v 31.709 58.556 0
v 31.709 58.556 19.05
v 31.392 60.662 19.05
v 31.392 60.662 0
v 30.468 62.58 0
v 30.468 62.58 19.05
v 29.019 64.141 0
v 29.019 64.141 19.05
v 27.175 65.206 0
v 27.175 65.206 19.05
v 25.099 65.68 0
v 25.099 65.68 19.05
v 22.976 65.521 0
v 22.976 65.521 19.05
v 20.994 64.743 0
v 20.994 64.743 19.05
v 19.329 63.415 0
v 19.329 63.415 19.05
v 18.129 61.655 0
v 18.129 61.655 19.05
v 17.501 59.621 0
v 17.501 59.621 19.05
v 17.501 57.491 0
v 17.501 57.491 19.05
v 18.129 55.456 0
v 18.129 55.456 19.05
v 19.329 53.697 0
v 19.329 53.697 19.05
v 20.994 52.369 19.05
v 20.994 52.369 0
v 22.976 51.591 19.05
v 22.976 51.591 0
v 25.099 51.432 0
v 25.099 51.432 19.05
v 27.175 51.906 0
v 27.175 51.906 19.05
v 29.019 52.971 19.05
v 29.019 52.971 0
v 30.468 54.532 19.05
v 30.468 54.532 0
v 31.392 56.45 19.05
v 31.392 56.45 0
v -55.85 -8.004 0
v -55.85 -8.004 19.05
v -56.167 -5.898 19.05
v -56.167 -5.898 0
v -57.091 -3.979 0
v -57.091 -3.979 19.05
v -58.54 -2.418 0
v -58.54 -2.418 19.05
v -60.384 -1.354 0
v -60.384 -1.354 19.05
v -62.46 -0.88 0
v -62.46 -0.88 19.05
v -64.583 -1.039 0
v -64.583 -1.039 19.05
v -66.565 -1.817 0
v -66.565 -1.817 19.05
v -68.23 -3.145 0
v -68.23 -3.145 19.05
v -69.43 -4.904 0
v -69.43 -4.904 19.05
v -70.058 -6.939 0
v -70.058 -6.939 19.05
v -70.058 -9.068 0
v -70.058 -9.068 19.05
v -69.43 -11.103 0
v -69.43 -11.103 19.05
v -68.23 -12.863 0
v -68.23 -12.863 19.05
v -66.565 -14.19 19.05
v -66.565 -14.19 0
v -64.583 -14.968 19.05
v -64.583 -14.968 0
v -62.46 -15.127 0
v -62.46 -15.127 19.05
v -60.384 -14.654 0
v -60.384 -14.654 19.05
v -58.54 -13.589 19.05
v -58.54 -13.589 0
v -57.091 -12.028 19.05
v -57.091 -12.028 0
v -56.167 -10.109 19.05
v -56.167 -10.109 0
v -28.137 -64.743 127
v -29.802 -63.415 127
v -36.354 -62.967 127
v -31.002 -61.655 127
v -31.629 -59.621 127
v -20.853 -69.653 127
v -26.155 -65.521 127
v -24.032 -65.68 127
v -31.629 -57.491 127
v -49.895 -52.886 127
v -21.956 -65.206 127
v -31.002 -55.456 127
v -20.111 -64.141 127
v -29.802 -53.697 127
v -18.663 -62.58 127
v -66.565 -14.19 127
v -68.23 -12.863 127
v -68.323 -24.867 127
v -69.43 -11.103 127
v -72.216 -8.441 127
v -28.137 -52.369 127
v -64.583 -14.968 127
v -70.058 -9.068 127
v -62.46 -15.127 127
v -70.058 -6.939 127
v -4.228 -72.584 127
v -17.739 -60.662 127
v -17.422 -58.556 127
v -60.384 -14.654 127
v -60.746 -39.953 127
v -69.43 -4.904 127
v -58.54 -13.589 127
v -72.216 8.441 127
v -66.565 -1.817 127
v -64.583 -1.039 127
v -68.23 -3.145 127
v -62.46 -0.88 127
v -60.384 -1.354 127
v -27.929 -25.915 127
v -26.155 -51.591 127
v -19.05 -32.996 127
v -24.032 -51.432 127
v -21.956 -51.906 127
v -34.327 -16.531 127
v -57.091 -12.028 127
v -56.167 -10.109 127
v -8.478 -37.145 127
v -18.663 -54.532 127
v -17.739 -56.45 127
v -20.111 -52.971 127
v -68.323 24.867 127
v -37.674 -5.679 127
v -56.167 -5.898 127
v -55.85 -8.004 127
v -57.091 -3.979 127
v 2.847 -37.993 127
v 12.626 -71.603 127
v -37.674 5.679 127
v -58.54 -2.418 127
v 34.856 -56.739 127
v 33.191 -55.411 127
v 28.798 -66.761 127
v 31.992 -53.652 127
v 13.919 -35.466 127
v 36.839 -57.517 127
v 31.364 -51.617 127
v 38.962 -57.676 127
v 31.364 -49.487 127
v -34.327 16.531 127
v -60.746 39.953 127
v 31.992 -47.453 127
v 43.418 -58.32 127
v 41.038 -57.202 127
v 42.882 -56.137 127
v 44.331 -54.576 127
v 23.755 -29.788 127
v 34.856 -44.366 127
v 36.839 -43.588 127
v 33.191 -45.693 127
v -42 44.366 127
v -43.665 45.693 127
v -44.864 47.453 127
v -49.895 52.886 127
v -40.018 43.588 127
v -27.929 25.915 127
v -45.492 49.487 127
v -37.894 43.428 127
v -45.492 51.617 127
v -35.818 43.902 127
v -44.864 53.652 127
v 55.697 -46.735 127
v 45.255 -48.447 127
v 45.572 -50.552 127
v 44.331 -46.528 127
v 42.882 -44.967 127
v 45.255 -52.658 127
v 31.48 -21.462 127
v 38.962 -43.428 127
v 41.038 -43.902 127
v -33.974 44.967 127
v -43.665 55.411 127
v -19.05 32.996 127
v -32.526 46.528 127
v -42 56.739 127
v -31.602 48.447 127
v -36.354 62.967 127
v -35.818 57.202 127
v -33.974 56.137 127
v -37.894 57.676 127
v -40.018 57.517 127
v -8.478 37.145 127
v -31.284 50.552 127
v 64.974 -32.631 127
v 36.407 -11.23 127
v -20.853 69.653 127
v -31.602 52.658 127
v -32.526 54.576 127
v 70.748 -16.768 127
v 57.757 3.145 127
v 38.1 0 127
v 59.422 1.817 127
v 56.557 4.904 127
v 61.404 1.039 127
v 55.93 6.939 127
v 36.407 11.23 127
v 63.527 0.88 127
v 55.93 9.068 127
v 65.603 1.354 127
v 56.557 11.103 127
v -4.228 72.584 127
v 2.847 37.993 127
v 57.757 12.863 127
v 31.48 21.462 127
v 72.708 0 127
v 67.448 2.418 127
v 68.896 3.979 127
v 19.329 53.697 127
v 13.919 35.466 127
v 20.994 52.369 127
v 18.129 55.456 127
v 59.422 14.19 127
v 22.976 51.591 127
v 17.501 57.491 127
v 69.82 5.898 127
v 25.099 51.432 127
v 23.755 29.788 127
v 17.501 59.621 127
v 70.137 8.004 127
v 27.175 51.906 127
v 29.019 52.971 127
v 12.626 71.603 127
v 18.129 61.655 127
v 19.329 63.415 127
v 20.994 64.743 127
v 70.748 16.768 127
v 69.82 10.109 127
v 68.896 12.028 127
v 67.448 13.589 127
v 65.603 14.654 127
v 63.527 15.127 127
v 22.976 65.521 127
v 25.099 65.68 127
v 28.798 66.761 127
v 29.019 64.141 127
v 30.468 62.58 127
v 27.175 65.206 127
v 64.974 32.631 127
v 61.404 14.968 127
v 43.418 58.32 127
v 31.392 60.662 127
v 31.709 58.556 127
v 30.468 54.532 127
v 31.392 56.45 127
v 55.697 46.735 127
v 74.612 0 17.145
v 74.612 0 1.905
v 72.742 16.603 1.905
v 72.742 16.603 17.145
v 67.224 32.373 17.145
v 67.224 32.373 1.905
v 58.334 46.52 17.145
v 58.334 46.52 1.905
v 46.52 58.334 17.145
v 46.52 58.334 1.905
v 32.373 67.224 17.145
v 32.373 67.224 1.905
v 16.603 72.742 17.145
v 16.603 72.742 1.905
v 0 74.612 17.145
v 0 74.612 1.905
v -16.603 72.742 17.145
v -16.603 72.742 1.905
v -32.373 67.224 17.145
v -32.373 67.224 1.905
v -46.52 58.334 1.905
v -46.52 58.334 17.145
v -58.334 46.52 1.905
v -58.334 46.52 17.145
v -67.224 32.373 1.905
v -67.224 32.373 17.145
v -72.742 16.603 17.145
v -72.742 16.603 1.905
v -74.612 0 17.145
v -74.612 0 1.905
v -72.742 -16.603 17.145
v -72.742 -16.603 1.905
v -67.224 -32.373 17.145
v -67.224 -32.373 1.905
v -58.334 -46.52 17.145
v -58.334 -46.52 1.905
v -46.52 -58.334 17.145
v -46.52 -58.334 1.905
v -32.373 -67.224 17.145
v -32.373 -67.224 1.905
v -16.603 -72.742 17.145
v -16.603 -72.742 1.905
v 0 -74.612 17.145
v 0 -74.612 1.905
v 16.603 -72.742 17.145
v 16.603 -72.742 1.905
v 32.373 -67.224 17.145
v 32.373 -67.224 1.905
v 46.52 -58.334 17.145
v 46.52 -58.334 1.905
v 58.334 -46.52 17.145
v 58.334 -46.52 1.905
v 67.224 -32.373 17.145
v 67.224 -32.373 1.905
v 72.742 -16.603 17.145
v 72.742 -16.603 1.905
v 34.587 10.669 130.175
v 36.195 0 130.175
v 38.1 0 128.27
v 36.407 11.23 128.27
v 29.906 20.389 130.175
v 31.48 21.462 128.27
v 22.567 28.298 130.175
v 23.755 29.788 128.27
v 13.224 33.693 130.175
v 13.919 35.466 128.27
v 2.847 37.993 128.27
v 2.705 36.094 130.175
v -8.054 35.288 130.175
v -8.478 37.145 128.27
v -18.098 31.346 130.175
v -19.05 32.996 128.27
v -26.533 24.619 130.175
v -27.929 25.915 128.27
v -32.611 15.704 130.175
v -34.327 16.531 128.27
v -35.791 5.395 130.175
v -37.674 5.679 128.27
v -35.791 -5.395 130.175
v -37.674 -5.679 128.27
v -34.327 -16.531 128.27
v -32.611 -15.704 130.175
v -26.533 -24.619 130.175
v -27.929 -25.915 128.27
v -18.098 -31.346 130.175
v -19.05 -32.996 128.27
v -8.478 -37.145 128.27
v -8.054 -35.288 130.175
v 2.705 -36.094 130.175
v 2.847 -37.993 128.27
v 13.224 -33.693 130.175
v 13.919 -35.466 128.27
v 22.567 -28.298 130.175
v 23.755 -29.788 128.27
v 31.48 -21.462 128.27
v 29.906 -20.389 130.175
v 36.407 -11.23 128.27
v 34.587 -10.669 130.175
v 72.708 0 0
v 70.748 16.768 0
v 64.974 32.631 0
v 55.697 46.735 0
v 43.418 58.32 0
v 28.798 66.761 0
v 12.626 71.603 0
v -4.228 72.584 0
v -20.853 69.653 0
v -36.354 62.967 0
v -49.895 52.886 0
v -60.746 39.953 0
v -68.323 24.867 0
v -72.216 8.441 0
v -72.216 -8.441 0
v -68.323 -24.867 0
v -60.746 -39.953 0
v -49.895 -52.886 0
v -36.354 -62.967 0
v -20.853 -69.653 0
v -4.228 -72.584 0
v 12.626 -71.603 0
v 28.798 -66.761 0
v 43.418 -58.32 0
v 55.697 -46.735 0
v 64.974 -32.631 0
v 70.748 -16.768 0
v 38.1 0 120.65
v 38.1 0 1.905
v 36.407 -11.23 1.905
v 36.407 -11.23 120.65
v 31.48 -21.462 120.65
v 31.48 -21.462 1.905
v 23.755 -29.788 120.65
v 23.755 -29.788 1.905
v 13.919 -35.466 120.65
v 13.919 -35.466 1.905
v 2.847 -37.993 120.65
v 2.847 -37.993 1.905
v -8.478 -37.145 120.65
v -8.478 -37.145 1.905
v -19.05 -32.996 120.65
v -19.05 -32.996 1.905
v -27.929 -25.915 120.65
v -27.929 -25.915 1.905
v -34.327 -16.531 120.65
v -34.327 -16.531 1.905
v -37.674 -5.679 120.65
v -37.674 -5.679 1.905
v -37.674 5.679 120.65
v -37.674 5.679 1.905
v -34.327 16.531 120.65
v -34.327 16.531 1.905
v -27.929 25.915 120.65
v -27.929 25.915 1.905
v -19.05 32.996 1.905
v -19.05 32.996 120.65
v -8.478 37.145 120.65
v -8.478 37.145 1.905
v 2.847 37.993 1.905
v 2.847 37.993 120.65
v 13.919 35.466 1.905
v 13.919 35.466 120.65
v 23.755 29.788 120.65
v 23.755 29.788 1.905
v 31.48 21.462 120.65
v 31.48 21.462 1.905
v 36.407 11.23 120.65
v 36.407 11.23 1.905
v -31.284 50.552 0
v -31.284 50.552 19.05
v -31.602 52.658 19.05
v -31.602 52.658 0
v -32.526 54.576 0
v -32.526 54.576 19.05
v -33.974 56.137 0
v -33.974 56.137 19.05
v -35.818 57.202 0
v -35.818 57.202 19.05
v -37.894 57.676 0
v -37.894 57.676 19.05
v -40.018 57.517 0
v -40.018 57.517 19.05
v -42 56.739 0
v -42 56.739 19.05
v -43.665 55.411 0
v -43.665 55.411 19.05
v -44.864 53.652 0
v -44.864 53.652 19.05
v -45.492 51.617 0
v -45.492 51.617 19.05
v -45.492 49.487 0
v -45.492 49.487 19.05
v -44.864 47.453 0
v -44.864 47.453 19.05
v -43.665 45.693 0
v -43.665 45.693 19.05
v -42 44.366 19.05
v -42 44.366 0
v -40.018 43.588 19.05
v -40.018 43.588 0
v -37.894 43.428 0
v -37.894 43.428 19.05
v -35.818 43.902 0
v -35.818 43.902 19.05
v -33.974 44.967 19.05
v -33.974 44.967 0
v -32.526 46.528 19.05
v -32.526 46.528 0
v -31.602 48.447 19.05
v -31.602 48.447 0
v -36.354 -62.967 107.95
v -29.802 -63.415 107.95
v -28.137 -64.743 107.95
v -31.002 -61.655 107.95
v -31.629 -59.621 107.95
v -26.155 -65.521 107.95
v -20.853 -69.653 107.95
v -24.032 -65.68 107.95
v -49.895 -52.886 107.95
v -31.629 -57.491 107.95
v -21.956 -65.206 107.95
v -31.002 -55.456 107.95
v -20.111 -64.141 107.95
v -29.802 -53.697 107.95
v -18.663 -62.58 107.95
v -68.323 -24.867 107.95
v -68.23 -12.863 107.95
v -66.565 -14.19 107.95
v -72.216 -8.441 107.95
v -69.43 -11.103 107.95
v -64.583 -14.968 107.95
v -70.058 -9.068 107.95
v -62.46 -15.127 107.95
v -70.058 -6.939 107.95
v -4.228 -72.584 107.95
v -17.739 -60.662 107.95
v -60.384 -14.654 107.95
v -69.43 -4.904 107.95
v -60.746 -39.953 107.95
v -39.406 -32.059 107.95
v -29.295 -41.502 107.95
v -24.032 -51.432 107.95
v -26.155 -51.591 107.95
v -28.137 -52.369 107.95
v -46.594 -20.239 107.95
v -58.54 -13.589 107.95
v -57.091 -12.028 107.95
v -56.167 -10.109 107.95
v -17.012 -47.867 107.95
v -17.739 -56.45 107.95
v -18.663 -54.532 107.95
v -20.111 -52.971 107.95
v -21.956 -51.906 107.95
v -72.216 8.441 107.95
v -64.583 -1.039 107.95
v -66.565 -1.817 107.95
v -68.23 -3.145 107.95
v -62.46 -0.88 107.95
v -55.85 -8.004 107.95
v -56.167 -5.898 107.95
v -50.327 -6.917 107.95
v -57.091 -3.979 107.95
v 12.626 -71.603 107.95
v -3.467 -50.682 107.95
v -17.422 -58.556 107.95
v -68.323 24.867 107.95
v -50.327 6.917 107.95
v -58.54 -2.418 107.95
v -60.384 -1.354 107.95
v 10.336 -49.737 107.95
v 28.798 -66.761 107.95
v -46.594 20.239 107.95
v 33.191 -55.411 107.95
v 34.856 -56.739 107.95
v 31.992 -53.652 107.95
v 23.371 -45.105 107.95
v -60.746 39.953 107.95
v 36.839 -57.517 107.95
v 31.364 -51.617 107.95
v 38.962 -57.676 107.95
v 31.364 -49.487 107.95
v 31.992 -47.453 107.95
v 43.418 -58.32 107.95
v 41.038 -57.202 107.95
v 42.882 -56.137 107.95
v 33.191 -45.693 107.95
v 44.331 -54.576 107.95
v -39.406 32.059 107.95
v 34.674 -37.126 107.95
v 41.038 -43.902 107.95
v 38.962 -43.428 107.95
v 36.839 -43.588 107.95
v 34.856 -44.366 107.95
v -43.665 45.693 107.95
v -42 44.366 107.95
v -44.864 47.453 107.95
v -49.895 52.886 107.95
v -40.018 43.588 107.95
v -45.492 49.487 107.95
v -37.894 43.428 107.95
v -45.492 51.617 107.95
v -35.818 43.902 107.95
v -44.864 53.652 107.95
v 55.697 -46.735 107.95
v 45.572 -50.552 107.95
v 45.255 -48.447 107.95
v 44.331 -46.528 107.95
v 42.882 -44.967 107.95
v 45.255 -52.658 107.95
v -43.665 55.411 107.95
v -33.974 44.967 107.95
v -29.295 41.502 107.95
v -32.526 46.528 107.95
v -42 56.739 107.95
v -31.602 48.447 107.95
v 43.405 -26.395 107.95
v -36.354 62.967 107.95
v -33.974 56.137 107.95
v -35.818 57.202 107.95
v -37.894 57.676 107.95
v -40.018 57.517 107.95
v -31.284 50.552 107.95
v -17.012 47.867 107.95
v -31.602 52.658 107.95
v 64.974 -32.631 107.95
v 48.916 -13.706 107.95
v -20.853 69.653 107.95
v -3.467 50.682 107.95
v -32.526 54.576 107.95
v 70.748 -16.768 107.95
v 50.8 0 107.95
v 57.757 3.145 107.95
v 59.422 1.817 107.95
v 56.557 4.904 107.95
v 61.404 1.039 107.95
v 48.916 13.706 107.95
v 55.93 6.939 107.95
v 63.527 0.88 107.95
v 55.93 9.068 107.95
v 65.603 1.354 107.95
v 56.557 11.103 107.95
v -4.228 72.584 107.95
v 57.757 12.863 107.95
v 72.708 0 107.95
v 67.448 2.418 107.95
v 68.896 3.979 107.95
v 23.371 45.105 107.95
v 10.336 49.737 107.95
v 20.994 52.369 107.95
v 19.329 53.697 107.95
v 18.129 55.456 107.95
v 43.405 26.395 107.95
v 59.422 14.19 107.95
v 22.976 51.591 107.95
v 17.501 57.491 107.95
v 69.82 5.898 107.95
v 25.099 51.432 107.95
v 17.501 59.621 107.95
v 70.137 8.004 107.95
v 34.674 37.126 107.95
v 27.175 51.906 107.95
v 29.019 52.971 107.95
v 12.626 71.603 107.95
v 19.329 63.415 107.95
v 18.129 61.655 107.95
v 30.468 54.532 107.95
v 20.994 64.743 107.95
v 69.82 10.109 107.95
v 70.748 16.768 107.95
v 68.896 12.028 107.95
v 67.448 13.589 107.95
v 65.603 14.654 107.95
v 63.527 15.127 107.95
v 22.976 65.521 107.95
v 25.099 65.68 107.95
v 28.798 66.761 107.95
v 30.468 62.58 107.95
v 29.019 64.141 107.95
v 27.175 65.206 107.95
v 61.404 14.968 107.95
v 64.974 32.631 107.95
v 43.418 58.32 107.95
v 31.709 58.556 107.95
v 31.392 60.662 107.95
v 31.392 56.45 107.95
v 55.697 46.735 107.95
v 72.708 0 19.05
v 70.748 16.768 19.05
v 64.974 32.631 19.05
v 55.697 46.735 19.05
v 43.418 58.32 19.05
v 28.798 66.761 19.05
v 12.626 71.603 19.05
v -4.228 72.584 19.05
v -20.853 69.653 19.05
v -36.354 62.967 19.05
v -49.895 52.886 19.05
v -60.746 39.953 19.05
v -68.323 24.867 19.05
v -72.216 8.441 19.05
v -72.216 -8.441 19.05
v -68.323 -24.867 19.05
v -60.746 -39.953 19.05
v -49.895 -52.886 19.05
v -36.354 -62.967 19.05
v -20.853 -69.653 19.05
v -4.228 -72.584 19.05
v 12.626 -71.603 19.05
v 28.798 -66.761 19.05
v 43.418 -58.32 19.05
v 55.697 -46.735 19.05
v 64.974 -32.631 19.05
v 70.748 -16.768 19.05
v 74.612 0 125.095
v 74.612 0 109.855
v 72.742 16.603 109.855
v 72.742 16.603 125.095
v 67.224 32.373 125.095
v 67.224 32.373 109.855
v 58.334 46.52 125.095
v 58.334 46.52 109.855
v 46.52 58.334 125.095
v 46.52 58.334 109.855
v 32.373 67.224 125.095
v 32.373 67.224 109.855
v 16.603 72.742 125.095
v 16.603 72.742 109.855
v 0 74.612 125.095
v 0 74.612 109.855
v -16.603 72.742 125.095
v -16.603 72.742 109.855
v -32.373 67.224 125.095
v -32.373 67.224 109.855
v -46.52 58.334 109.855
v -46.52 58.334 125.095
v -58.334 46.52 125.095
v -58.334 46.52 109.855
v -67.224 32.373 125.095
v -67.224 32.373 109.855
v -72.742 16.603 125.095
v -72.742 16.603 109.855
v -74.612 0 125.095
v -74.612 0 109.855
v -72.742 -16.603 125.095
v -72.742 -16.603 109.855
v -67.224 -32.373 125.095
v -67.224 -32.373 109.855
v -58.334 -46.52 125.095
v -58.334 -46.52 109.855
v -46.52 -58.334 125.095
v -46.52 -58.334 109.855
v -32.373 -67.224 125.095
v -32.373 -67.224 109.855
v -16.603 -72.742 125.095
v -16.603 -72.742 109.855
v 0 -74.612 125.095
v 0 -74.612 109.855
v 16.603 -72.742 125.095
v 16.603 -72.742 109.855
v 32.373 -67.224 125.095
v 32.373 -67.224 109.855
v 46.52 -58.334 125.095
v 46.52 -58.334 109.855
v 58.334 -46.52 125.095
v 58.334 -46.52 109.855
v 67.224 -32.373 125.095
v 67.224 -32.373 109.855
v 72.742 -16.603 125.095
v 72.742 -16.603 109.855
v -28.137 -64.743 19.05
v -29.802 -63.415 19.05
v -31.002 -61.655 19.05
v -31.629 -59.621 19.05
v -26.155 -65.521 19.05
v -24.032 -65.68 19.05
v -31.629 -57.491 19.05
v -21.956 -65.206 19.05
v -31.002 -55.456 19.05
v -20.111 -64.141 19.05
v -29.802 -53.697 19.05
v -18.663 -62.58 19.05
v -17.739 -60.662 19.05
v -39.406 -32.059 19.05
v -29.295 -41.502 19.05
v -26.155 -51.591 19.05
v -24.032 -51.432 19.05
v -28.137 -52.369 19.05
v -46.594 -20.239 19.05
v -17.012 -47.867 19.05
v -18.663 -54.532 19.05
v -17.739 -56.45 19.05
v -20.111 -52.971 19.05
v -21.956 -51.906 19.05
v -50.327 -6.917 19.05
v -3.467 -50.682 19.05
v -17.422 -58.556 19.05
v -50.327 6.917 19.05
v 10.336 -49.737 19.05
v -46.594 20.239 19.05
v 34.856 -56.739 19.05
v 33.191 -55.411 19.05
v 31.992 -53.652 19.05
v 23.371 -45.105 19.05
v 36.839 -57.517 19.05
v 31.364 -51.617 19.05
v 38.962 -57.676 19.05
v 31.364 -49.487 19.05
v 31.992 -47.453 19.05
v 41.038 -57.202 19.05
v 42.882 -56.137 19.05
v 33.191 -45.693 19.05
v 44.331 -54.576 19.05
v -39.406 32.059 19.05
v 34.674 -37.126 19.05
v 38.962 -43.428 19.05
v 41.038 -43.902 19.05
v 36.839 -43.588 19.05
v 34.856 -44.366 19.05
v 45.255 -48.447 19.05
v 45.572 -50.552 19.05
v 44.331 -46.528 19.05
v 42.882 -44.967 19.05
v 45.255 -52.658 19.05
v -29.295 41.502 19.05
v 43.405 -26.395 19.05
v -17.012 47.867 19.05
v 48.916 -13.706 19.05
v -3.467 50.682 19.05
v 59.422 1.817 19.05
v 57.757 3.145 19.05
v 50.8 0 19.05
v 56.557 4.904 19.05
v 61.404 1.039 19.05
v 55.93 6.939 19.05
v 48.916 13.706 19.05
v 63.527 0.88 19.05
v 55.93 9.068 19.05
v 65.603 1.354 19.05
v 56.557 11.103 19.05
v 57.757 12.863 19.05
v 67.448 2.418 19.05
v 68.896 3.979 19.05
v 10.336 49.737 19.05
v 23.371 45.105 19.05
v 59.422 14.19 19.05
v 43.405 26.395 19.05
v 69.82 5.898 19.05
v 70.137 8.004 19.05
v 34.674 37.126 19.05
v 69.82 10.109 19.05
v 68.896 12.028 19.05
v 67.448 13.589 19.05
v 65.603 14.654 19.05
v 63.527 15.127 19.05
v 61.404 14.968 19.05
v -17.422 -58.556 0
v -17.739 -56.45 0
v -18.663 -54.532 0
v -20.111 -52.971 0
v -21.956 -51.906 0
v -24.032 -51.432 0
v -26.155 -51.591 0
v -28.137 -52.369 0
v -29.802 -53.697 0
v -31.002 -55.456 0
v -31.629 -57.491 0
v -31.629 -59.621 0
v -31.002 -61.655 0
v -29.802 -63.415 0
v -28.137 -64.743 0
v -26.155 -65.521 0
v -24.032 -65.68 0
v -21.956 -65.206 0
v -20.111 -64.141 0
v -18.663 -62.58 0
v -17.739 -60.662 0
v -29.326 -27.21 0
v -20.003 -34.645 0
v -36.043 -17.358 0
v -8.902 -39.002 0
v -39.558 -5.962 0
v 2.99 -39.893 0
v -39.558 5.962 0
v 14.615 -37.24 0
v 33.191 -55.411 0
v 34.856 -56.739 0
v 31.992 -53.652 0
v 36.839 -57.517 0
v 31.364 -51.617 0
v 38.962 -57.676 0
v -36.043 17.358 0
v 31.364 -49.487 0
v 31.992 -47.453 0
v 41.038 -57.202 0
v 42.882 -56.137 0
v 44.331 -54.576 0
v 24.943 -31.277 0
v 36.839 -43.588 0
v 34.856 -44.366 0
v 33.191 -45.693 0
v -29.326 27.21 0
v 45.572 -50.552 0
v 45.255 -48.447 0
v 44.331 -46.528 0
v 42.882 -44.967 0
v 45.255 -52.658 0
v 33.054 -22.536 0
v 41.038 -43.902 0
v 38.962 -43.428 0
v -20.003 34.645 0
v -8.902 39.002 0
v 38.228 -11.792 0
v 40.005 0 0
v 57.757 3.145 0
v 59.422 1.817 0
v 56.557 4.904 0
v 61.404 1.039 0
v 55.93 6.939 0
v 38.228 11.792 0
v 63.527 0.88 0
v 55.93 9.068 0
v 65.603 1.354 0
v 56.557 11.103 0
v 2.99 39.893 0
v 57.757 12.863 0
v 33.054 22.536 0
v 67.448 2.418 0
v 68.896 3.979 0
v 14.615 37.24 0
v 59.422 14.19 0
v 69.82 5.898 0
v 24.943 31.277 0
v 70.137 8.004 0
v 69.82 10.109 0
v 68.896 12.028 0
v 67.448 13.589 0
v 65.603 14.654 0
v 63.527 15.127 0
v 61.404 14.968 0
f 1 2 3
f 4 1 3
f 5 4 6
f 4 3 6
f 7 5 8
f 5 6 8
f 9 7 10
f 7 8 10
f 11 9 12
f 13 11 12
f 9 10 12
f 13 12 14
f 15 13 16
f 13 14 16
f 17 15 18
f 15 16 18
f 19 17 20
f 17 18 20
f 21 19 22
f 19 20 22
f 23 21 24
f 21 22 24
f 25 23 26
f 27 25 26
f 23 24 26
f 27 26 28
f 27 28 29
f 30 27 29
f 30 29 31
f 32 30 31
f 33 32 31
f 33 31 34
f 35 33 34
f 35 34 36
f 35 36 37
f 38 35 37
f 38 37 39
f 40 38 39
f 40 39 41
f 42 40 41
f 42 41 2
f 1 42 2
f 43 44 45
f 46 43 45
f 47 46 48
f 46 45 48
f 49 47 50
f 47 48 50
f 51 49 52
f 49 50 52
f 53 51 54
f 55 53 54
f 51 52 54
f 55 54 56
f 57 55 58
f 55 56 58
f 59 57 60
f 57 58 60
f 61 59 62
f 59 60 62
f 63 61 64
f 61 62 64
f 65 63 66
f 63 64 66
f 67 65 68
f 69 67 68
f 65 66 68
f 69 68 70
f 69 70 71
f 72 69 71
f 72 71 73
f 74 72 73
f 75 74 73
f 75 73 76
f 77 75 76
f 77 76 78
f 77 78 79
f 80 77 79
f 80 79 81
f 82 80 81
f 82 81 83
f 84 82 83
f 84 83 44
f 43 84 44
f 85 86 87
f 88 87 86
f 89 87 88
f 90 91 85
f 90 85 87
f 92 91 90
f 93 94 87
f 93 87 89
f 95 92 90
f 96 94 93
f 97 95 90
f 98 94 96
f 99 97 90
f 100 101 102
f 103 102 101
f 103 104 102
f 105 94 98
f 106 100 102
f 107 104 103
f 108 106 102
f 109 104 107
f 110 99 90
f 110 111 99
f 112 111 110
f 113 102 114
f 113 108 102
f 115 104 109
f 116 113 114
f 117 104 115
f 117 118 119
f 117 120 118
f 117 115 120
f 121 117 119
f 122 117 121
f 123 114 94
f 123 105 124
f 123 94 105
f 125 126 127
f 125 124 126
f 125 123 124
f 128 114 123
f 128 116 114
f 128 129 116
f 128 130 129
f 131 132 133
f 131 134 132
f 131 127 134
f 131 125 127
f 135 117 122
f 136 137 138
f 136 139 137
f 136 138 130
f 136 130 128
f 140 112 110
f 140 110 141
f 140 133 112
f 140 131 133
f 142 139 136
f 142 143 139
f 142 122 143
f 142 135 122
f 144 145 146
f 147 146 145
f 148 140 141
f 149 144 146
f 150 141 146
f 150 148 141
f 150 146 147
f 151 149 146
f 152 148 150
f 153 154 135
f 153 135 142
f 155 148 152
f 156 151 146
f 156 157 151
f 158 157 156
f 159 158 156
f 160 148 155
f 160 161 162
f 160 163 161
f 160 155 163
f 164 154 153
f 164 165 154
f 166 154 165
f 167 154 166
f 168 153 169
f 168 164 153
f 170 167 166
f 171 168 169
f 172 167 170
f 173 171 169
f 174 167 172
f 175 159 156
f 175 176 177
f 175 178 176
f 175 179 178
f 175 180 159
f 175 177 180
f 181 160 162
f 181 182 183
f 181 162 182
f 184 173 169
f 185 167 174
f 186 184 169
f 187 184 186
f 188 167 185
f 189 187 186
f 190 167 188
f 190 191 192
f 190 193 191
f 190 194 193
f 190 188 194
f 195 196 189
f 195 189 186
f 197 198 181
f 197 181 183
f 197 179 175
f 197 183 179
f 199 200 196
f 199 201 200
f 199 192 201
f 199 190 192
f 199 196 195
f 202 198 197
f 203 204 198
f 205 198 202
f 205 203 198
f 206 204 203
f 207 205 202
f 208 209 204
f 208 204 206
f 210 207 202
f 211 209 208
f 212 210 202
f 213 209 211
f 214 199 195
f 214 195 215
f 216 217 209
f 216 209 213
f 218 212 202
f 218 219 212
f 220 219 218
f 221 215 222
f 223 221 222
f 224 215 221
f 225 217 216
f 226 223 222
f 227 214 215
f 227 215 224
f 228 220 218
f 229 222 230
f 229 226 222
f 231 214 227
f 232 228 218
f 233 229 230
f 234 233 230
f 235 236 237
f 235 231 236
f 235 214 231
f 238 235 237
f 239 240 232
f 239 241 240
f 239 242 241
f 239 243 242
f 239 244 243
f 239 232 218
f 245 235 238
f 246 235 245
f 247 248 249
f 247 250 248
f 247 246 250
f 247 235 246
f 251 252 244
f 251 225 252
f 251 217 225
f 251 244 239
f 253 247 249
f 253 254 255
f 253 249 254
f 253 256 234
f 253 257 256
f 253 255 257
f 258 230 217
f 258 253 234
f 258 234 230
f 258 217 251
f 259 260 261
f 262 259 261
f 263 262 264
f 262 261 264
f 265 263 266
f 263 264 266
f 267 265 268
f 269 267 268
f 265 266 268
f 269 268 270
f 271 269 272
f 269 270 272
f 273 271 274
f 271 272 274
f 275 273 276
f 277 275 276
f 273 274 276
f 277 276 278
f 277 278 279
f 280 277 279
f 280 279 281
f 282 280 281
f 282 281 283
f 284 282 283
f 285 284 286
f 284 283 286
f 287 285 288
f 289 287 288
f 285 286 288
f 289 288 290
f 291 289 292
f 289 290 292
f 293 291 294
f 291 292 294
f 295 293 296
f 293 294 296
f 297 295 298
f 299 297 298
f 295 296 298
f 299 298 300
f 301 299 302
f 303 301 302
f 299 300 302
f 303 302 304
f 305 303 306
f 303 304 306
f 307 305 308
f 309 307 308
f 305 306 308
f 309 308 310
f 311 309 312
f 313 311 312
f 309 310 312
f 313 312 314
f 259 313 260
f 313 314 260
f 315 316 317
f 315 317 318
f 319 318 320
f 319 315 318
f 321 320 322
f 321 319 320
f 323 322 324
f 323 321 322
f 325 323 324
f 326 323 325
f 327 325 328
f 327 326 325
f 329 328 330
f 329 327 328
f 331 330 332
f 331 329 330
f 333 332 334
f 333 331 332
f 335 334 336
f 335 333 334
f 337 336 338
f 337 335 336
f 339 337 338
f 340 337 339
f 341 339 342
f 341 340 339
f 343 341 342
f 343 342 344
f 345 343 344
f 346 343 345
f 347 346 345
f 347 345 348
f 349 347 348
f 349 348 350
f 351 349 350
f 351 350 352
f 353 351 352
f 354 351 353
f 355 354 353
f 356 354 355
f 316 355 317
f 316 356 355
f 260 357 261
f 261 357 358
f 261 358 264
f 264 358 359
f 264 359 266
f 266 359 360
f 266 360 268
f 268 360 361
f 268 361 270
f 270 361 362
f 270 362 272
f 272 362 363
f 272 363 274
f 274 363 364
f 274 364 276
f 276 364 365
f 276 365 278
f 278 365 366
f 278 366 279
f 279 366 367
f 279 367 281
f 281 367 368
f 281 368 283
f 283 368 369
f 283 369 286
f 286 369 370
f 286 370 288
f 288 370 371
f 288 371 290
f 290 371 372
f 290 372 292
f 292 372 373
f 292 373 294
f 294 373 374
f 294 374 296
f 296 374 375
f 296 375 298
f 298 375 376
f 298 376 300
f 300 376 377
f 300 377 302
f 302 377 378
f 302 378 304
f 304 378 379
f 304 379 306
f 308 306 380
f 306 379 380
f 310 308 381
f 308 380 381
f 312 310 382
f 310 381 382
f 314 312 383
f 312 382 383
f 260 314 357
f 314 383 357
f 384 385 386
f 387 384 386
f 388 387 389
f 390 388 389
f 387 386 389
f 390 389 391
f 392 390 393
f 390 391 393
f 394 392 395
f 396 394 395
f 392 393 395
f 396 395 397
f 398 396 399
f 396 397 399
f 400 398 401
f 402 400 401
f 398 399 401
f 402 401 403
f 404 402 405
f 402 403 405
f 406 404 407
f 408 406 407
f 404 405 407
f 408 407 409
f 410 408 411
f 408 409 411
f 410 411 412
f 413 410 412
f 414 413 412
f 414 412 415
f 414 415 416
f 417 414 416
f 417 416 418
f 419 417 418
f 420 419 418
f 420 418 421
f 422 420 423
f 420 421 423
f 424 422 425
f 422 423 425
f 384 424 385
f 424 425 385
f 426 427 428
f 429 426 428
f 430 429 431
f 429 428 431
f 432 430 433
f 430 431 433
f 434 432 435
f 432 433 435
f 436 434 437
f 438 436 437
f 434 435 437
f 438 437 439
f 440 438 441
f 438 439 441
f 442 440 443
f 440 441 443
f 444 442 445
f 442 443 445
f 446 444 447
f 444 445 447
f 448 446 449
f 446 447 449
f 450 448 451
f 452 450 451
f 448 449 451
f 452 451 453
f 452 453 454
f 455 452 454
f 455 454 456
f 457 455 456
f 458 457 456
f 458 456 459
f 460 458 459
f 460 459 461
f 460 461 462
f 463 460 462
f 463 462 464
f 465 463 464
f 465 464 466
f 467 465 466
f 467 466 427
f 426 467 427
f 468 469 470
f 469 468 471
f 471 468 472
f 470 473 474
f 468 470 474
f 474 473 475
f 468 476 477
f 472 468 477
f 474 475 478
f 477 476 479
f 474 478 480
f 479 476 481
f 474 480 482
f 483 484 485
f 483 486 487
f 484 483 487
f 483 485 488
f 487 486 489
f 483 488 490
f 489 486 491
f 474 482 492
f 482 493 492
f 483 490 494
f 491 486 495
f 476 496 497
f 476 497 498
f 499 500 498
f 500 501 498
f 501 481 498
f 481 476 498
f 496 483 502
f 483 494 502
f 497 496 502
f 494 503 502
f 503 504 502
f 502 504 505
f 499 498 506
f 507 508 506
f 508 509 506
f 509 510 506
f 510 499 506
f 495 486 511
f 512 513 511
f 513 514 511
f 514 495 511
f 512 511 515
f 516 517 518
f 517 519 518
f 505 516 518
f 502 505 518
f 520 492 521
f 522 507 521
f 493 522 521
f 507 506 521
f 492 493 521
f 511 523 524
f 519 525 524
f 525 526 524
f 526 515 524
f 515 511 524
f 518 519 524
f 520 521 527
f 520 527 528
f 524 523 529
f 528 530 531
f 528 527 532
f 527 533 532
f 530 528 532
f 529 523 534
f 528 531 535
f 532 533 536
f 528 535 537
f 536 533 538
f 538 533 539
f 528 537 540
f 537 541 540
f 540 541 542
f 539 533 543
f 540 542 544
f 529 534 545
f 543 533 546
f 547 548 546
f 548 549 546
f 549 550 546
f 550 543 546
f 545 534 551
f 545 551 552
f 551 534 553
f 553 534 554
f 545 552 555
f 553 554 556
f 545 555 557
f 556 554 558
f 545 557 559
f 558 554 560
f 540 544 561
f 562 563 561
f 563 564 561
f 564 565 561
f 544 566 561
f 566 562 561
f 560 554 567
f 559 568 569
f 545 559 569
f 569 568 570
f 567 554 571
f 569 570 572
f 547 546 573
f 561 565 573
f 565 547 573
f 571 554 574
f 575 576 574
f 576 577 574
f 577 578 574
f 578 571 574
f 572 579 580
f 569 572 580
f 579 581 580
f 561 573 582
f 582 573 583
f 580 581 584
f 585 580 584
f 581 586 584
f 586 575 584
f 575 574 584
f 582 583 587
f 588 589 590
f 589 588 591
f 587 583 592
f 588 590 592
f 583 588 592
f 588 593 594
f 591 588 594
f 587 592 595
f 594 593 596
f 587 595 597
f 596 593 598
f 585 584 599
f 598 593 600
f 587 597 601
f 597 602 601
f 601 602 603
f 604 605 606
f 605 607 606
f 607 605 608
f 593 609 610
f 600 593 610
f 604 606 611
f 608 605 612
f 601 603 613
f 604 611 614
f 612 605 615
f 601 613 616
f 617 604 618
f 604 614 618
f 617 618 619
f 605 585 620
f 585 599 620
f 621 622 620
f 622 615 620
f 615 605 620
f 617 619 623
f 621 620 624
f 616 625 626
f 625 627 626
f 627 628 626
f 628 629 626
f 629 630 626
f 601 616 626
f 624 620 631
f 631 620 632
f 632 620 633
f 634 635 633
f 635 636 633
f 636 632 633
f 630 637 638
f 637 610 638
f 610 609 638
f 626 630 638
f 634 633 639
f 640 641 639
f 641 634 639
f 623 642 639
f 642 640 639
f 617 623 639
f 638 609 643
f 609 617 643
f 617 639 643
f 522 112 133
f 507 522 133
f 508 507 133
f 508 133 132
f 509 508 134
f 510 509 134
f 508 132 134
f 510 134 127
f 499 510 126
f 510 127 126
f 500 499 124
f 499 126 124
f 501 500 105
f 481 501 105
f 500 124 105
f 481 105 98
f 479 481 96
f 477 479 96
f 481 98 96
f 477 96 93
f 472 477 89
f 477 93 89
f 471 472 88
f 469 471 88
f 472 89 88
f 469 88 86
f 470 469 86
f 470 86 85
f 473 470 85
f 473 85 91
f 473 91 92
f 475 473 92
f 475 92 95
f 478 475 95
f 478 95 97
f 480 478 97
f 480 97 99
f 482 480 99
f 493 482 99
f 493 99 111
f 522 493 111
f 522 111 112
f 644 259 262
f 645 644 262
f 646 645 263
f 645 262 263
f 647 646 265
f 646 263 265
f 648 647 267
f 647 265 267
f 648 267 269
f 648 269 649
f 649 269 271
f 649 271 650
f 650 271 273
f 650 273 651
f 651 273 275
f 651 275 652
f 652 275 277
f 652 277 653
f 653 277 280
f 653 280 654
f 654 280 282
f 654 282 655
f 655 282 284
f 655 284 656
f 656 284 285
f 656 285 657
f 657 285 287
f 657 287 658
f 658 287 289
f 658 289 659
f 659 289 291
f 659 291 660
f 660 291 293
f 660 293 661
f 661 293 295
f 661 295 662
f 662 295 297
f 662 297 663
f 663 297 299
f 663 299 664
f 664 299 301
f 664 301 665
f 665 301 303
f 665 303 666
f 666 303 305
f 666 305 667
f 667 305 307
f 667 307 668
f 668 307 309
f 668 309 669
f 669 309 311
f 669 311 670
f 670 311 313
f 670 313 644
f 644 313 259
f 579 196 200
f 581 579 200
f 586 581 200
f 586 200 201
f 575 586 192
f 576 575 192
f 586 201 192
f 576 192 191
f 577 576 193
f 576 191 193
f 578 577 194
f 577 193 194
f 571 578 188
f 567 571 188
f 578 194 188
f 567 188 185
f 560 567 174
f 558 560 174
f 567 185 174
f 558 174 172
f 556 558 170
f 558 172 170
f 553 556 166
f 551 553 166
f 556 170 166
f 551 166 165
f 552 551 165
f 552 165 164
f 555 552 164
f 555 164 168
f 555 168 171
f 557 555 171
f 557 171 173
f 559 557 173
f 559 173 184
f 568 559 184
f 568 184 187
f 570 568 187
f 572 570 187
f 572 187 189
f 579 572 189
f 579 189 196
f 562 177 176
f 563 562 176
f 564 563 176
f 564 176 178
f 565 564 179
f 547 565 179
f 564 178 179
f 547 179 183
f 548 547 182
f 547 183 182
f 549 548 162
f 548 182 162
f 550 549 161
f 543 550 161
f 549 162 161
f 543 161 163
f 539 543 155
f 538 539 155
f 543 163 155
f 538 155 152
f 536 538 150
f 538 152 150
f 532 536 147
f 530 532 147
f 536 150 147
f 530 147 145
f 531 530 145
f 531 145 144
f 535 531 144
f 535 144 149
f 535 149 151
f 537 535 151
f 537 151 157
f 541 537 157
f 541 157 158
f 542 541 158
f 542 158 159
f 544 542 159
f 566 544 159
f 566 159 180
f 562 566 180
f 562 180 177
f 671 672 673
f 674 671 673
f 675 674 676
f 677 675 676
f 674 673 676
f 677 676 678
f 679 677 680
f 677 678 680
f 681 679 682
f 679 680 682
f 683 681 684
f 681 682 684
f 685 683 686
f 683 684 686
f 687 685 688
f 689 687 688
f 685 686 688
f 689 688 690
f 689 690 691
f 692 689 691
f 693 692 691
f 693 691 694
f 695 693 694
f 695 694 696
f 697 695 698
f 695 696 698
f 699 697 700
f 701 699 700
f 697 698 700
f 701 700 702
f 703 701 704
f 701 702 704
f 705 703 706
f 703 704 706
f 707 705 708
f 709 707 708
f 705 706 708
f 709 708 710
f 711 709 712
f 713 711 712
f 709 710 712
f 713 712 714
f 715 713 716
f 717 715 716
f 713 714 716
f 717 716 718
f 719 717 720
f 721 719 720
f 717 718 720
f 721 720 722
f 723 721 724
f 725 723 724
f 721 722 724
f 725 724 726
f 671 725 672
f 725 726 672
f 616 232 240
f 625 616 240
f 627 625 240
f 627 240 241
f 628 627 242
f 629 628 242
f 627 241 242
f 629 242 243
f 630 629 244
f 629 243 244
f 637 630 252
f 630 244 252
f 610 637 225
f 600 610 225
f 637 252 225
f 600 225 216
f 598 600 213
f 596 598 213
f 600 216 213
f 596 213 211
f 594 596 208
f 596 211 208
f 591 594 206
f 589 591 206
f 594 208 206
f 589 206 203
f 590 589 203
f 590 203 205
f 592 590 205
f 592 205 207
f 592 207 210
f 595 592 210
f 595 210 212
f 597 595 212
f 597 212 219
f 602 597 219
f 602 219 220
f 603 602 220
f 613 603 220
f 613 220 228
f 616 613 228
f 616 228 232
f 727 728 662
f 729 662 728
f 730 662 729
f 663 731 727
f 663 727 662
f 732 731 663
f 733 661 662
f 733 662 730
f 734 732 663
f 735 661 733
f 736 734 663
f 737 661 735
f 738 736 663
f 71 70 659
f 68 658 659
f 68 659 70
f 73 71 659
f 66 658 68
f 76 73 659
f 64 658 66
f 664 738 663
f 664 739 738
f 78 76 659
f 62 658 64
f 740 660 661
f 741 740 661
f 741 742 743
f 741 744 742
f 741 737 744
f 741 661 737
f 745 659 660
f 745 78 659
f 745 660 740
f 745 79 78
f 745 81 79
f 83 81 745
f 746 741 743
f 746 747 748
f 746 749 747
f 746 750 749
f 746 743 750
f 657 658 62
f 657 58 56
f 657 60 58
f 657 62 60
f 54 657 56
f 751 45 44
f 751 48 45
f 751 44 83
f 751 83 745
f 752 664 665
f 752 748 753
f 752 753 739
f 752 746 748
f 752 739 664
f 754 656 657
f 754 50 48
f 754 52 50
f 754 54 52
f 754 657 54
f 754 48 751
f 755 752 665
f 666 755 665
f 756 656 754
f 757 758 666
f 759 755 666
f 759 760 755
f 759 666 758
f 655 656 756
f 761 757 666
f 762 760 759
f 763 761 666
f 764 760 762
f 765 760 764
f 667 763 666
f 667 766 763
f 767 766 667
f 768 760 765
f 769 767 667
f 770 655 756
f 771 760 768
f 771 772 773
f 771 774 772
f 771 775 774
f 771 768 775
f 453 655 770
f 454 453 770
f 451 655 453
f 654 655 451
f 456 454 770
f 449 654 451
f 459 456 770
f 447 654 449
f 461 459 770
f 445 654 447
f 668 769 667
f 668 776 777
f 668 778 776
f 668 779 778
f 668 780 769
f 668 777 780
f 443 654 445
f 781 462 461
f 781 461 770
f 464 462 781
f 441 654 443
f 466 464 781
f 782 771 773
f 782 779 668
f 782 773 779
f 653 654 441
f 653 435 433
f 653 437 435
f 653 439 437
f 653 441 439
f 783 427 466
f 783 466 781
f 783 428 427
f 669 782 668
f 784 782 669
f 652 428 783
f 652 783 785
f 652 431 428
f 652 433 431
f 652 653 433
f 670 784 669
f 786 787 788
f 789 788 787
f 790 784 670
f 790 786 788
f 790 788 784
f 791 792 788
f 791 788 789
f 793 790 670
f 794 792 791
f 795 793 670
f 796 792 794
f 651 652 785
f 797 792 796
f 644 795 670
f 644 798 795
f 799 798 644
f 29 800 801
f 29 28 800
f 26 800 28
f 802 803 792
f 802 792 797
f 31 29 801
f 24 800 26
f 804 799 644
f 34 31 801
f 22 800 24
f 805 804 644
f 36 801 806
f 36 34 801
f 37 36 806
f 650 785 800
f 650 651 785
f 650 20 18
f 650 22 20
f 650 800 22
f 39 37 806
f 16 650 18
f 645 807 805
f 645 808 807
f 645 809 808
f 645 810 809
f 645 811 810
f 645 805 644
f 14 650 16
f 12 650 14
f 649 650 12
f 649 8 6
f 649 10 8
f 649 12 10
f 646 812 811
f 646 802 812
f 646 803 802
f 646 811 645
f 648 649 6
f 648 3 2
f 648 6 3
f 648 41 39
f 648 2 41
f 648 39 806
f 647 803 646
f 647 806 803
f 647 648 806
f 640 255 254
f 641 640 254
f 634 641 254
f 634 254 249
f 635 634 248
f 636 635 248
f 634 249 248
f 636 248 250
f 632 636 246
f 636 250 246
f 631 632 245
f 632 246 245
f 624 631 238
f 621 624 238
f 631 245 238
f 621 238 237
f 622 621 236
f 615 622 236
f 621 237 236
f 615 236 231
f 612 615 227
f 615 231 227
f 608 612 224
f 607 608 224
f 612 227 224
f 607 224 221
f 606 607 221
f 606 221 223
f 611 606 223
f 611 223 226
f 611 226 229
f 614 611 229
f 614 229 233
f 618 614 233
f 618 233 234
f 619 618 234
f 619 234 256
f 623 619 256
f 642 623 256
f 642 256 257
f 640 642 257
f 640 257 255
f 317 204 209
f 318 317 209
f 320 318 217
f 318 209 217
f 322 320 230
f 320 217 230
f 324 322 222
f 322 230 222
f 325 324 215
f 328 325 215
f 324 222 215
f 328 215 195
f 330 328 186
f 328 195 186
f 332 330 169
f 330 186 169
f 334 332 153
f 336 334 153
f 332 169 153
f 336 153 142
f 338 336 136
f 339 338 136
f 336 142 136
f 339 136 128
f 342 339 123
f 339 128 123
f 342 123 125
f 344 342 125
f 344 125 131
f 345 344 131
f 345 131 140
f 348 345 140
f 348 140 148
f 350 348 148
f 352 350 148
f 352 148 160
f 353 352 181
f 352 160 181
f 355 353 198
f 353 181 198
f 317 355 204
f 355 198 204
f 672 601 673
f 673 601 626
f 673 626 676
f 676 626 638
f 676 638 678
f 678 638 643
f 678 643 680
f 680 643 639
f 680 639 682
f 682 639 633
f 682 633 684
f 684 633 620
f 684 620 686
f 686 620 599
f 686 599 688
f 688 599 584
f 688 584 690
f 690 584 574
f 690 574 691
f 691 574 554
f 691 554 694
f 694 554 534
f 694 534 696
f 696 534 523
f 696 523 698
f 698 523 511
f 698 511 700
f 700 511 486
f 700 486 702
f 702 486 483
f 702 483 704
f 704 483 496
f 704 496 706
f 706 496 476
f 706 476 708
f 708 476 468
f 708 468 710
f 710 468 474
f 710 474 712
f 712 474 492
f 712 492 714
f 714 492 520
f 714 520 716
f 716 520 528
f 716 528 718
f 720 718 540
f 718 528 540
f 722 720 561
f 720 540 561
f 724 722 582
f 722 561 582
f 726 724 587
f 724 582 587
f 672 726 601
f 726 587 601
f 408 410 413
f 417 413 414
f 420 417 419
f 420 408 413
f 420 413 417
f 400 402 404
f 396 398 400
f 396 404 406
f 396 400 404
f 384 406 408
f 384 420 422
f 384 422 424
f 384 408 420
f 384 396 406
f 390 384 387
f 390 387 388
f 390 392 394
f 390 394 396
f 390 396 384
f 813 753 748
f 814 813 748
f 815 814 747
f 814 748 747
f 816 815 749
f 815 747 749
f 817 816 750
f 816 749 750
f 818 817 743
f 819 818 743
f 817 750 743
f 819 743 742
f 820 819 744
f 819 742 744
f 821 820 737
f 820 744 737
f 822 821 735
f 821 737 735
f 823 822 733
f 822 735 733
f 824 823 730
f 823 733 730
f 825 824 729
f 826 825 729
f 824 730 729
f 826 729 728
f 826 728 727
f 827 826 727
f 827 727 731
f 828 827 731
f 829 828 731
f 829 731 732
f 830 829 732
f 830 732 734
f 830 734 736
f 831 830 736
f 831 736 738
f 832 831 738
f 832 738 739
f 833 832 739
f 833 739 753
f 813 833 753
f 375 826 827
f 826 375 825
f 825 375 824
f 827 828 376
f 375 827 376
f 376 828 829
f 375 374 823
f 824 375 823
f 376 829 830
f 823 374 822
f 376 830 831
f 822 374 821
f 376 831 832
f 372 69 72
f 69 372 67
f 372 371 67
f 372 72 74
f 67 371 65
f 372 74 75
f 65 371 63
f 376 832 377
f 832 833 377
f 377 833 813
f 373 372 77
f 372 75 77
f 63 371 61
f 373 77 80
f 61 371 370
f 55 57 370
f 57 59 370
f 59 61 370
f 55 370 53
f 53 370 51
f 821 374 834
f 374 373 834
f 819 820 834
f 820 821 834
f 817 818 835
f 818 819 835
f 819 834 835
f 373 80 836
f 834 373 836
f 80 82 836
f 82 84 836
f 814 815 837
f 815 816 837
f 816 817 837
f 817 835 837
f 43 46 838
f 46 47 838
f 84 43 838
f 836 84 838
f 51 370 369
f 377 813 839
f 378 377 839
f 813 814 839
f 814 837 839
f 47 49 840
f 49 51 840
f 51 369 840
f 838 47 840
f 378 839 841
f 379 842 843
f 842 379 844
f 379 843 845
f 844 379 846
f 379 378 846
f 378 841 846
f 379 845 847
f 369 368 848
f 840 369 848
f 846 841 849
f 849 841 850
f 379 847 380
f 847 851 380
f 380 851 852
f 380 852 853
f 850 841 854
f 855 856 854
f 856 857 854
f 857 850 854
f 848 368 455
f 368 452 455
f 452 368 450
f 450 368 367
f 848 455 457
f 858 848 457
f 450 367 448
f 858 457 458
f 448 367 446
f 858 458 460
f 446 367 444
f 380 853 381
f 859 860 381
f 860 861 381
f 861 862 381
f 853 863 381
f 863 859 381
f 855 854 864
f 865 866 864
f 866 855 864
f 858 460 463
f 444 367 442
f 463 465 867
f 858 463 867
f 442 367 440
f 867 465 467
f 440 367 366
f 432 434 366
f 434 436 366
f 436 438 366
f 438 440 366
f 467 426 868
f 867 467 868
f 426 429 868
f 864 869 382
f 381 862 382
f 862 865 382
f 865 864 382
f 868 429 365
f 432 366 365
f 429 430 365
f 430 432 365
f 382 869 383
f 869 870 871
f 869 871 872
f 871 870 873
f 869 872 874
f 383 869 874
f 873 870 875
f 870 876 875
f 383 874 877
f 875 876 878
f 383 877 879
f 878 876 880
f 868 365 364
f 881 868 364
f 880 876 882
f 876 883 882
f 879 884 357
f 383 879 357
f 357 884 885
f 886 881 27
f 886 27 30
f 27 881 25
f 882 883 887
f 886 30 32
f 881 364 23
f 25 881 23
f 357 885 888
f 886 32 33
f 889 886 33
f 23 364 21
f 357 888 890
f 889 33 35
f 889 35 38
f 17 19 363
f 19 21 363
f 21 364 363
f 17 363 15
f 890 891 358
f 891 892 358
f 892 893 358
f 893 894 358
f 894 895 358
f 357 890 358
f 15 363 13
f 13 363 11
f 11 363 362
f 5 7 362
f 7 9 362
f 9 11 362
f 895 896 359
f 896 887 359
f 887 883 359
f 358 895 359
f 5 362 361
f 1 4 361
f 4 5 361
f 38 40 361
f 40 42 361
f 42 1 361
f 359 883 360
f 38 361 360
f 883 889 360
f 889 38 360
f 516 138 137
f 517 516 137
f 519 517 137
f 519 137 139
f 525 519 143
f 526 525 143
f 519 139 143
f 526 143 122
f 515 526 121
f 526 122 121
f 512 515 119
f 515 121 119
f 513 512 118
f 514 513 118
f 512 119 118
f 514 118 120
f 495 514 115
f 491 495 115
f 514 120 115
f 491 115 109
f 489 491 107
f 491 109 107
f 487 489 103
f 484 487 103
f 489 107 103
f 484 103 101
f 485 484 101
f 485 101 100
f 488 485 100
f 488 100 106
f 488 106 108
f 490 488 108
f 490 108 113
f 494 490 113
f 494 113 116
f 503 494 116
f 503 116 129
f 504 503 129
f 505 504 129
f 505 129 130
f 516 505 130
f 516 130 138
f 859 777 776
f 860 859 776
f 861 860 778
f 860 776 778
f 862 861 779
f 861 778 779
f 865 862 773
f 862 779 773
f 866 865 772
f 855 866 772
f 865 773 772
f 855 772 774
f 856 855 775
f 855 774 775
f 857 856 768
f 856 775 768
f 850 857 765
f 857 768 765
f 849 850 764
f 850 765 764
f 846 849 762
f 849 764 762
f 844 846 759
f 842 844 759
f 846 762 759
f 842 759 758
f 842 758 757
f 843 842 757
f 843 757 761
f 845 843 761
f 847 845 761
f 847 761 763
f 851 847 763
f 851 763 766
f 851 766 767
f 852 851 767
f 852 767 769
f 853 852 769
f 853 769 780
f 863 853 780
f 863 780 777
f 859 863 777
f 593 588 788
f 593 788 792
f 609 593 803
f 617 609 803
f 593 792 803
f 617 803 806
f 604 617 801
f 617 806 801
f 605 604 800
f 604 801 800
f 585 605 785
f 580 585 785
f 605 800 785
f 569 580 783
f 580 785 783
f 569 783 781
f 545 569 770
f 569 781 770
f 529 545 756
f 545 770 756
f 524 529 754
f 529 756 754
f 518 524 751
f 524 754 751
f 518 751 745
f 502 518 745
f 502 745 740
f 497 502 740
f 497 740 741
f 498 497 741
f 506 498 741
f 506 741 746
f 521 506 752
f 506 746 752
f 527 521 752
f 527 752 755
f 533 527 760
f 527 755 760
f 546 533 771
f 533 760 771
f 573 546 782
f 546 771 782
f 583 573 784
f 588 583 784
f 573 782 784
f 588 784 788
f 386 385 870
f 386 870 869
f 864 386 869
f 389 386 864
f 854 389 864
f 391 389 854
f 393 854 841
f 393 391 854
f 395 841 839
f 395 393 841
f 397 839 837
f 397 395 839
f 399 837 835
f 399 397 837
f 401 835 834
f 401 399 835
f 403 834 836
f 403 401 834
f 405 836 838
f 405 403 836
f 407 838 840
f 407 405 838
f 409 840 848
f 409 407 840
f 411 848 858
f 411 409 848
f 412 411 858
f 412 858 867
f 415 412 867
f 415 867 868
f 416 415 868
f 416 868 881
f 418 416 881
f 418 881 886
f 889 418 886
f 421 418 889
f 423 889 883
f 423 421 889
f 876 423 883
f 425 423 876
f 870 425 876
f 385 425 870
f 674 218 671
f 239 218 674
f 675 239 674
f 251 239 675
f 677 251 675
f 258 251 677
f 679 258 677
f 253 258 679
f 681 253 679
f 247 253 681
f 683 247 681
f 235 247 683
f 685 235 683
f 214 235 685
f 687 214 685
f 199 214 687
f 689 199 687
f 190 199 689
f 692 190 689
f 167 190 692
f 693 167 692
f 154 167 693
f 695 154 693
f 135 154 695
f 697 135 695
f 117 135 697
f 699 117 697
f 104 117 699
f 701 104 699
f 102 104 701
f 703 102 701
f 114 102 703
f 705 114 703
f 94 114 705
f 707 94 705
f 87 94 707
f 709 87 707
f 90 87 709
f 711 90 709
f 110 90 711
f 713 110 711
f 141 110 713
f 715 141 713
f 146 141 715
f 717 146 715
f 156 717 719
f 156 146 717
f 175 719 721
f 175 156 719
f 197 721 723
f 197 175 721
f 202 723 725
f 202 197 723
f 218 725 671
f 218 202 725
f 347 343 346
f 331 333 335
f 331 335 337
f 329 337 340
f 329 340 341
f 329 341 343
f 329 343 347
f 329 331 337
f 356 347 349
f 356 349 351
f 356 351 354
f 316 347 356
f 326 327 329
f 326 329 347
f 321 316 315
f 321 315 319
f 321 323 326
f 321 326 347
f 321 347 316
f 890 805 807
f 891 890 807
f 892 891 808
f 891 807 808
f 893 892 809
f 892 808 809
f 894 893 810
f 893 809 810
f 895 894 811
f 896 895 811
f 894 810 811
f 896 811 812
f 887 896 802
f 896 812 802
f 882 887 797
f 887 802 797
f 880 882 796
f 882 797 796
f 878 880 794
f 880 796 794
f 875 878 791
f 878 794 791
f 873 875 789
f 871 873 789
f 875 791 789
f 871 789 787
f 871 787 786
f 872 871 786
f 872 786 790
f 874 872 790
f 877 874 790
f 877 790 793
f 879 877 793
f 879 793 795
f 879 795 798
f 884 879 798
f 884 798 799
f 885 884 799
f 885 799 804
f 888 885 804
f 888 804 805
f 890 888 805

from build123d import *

# Parameters (mm, degrees)
F0_R      = 74.6125
F1_DEPTH  = 19.05
F2_R      = 50.8
F3_DEPTH  = 88.9
F4_R      = 74.6125
F5_DEPTH  = 19.05
F6_R      = 7.14375
F7_DEPTH  = 127.001
F8_R      = 38.1
F9_DEPTH  = 3.175
F10_R     = 38.1
F11_DEPTH = 120.65
F12_SIZE  = 1.905


with BuildPart() as f1:
    # F0 (on Top) → F1 (new body)
    with BuildSketch(Plane.XY):
        Circle(F0_R)
    extrude(amount=F1_DEPTH)

    # F2 (on face) → F3 (join)
    with BuildSketch(Plane.XY.offset(19.05)):
        Circle(F2_R)
    extrude(amount=F3_DEPTH)

    # F4 (on face) → F5 (join)
    with BuildSketch(Plane.XY.offset(107.95)):
        Circle(F4_R)
    extrude(amount=F5_DEPTH)

    # F6 (on face) → F7 (cut, through all)
    with BuildSketch(Plane.XY.offset(127)):
        with Locations((24.5654228837, 58.5558707436)):
            Circle(F6_R)
        with Locations((-38.4281601629, 50.5522156438)):
            Circle(F6_R)
        with Locations((-62.9935830465, -8.0036550999)):
            Circle(F6_R)
        with Locations((-24.5654228837, -58.5558707436)):
            Circle(F6_R)
        with Locations((38.4281601629, -50.5522156438)):
            Circle(F6_R)
        with Locations((62.9935830465, 8.0036550999)):
            Circle(F6_R)
    extrude(amount=-F7_DEPTH, mode=Mode.SUBTRACT)

    # F8 (on face) → F9 (join)
    with BuildSketch(Plane.XY.offset(127)):
        Circle(F8_R)
    extrude(amount=F9_DEPTH)

    # F10 (on face) → F11 (cut)
    with BuildSketch(Plane(origin=(0, 0, 0), x_dir=(1, 0, 0), z_dir=(0, 0, -1))):
        Circle(F10_R)
    extrude(amount=-F11_DEPTH, mode=Mode.SUBTRACT)

    # F12
    f12_edges = [f1.edges().sort_by_distance(p)[0] for p in [
        (-74.6125, 0, 0),
        (-38.1, 0, 0),
        (-74.6125, 0, 19.05),
        (-74.6125, 0, 107.95),
        (-74.6125, 0, 127),
        (-38.1, 0, 130.175),
    ]]
    chamfer(f12_edges, length=F12_SIZE)


solid = f1.part
